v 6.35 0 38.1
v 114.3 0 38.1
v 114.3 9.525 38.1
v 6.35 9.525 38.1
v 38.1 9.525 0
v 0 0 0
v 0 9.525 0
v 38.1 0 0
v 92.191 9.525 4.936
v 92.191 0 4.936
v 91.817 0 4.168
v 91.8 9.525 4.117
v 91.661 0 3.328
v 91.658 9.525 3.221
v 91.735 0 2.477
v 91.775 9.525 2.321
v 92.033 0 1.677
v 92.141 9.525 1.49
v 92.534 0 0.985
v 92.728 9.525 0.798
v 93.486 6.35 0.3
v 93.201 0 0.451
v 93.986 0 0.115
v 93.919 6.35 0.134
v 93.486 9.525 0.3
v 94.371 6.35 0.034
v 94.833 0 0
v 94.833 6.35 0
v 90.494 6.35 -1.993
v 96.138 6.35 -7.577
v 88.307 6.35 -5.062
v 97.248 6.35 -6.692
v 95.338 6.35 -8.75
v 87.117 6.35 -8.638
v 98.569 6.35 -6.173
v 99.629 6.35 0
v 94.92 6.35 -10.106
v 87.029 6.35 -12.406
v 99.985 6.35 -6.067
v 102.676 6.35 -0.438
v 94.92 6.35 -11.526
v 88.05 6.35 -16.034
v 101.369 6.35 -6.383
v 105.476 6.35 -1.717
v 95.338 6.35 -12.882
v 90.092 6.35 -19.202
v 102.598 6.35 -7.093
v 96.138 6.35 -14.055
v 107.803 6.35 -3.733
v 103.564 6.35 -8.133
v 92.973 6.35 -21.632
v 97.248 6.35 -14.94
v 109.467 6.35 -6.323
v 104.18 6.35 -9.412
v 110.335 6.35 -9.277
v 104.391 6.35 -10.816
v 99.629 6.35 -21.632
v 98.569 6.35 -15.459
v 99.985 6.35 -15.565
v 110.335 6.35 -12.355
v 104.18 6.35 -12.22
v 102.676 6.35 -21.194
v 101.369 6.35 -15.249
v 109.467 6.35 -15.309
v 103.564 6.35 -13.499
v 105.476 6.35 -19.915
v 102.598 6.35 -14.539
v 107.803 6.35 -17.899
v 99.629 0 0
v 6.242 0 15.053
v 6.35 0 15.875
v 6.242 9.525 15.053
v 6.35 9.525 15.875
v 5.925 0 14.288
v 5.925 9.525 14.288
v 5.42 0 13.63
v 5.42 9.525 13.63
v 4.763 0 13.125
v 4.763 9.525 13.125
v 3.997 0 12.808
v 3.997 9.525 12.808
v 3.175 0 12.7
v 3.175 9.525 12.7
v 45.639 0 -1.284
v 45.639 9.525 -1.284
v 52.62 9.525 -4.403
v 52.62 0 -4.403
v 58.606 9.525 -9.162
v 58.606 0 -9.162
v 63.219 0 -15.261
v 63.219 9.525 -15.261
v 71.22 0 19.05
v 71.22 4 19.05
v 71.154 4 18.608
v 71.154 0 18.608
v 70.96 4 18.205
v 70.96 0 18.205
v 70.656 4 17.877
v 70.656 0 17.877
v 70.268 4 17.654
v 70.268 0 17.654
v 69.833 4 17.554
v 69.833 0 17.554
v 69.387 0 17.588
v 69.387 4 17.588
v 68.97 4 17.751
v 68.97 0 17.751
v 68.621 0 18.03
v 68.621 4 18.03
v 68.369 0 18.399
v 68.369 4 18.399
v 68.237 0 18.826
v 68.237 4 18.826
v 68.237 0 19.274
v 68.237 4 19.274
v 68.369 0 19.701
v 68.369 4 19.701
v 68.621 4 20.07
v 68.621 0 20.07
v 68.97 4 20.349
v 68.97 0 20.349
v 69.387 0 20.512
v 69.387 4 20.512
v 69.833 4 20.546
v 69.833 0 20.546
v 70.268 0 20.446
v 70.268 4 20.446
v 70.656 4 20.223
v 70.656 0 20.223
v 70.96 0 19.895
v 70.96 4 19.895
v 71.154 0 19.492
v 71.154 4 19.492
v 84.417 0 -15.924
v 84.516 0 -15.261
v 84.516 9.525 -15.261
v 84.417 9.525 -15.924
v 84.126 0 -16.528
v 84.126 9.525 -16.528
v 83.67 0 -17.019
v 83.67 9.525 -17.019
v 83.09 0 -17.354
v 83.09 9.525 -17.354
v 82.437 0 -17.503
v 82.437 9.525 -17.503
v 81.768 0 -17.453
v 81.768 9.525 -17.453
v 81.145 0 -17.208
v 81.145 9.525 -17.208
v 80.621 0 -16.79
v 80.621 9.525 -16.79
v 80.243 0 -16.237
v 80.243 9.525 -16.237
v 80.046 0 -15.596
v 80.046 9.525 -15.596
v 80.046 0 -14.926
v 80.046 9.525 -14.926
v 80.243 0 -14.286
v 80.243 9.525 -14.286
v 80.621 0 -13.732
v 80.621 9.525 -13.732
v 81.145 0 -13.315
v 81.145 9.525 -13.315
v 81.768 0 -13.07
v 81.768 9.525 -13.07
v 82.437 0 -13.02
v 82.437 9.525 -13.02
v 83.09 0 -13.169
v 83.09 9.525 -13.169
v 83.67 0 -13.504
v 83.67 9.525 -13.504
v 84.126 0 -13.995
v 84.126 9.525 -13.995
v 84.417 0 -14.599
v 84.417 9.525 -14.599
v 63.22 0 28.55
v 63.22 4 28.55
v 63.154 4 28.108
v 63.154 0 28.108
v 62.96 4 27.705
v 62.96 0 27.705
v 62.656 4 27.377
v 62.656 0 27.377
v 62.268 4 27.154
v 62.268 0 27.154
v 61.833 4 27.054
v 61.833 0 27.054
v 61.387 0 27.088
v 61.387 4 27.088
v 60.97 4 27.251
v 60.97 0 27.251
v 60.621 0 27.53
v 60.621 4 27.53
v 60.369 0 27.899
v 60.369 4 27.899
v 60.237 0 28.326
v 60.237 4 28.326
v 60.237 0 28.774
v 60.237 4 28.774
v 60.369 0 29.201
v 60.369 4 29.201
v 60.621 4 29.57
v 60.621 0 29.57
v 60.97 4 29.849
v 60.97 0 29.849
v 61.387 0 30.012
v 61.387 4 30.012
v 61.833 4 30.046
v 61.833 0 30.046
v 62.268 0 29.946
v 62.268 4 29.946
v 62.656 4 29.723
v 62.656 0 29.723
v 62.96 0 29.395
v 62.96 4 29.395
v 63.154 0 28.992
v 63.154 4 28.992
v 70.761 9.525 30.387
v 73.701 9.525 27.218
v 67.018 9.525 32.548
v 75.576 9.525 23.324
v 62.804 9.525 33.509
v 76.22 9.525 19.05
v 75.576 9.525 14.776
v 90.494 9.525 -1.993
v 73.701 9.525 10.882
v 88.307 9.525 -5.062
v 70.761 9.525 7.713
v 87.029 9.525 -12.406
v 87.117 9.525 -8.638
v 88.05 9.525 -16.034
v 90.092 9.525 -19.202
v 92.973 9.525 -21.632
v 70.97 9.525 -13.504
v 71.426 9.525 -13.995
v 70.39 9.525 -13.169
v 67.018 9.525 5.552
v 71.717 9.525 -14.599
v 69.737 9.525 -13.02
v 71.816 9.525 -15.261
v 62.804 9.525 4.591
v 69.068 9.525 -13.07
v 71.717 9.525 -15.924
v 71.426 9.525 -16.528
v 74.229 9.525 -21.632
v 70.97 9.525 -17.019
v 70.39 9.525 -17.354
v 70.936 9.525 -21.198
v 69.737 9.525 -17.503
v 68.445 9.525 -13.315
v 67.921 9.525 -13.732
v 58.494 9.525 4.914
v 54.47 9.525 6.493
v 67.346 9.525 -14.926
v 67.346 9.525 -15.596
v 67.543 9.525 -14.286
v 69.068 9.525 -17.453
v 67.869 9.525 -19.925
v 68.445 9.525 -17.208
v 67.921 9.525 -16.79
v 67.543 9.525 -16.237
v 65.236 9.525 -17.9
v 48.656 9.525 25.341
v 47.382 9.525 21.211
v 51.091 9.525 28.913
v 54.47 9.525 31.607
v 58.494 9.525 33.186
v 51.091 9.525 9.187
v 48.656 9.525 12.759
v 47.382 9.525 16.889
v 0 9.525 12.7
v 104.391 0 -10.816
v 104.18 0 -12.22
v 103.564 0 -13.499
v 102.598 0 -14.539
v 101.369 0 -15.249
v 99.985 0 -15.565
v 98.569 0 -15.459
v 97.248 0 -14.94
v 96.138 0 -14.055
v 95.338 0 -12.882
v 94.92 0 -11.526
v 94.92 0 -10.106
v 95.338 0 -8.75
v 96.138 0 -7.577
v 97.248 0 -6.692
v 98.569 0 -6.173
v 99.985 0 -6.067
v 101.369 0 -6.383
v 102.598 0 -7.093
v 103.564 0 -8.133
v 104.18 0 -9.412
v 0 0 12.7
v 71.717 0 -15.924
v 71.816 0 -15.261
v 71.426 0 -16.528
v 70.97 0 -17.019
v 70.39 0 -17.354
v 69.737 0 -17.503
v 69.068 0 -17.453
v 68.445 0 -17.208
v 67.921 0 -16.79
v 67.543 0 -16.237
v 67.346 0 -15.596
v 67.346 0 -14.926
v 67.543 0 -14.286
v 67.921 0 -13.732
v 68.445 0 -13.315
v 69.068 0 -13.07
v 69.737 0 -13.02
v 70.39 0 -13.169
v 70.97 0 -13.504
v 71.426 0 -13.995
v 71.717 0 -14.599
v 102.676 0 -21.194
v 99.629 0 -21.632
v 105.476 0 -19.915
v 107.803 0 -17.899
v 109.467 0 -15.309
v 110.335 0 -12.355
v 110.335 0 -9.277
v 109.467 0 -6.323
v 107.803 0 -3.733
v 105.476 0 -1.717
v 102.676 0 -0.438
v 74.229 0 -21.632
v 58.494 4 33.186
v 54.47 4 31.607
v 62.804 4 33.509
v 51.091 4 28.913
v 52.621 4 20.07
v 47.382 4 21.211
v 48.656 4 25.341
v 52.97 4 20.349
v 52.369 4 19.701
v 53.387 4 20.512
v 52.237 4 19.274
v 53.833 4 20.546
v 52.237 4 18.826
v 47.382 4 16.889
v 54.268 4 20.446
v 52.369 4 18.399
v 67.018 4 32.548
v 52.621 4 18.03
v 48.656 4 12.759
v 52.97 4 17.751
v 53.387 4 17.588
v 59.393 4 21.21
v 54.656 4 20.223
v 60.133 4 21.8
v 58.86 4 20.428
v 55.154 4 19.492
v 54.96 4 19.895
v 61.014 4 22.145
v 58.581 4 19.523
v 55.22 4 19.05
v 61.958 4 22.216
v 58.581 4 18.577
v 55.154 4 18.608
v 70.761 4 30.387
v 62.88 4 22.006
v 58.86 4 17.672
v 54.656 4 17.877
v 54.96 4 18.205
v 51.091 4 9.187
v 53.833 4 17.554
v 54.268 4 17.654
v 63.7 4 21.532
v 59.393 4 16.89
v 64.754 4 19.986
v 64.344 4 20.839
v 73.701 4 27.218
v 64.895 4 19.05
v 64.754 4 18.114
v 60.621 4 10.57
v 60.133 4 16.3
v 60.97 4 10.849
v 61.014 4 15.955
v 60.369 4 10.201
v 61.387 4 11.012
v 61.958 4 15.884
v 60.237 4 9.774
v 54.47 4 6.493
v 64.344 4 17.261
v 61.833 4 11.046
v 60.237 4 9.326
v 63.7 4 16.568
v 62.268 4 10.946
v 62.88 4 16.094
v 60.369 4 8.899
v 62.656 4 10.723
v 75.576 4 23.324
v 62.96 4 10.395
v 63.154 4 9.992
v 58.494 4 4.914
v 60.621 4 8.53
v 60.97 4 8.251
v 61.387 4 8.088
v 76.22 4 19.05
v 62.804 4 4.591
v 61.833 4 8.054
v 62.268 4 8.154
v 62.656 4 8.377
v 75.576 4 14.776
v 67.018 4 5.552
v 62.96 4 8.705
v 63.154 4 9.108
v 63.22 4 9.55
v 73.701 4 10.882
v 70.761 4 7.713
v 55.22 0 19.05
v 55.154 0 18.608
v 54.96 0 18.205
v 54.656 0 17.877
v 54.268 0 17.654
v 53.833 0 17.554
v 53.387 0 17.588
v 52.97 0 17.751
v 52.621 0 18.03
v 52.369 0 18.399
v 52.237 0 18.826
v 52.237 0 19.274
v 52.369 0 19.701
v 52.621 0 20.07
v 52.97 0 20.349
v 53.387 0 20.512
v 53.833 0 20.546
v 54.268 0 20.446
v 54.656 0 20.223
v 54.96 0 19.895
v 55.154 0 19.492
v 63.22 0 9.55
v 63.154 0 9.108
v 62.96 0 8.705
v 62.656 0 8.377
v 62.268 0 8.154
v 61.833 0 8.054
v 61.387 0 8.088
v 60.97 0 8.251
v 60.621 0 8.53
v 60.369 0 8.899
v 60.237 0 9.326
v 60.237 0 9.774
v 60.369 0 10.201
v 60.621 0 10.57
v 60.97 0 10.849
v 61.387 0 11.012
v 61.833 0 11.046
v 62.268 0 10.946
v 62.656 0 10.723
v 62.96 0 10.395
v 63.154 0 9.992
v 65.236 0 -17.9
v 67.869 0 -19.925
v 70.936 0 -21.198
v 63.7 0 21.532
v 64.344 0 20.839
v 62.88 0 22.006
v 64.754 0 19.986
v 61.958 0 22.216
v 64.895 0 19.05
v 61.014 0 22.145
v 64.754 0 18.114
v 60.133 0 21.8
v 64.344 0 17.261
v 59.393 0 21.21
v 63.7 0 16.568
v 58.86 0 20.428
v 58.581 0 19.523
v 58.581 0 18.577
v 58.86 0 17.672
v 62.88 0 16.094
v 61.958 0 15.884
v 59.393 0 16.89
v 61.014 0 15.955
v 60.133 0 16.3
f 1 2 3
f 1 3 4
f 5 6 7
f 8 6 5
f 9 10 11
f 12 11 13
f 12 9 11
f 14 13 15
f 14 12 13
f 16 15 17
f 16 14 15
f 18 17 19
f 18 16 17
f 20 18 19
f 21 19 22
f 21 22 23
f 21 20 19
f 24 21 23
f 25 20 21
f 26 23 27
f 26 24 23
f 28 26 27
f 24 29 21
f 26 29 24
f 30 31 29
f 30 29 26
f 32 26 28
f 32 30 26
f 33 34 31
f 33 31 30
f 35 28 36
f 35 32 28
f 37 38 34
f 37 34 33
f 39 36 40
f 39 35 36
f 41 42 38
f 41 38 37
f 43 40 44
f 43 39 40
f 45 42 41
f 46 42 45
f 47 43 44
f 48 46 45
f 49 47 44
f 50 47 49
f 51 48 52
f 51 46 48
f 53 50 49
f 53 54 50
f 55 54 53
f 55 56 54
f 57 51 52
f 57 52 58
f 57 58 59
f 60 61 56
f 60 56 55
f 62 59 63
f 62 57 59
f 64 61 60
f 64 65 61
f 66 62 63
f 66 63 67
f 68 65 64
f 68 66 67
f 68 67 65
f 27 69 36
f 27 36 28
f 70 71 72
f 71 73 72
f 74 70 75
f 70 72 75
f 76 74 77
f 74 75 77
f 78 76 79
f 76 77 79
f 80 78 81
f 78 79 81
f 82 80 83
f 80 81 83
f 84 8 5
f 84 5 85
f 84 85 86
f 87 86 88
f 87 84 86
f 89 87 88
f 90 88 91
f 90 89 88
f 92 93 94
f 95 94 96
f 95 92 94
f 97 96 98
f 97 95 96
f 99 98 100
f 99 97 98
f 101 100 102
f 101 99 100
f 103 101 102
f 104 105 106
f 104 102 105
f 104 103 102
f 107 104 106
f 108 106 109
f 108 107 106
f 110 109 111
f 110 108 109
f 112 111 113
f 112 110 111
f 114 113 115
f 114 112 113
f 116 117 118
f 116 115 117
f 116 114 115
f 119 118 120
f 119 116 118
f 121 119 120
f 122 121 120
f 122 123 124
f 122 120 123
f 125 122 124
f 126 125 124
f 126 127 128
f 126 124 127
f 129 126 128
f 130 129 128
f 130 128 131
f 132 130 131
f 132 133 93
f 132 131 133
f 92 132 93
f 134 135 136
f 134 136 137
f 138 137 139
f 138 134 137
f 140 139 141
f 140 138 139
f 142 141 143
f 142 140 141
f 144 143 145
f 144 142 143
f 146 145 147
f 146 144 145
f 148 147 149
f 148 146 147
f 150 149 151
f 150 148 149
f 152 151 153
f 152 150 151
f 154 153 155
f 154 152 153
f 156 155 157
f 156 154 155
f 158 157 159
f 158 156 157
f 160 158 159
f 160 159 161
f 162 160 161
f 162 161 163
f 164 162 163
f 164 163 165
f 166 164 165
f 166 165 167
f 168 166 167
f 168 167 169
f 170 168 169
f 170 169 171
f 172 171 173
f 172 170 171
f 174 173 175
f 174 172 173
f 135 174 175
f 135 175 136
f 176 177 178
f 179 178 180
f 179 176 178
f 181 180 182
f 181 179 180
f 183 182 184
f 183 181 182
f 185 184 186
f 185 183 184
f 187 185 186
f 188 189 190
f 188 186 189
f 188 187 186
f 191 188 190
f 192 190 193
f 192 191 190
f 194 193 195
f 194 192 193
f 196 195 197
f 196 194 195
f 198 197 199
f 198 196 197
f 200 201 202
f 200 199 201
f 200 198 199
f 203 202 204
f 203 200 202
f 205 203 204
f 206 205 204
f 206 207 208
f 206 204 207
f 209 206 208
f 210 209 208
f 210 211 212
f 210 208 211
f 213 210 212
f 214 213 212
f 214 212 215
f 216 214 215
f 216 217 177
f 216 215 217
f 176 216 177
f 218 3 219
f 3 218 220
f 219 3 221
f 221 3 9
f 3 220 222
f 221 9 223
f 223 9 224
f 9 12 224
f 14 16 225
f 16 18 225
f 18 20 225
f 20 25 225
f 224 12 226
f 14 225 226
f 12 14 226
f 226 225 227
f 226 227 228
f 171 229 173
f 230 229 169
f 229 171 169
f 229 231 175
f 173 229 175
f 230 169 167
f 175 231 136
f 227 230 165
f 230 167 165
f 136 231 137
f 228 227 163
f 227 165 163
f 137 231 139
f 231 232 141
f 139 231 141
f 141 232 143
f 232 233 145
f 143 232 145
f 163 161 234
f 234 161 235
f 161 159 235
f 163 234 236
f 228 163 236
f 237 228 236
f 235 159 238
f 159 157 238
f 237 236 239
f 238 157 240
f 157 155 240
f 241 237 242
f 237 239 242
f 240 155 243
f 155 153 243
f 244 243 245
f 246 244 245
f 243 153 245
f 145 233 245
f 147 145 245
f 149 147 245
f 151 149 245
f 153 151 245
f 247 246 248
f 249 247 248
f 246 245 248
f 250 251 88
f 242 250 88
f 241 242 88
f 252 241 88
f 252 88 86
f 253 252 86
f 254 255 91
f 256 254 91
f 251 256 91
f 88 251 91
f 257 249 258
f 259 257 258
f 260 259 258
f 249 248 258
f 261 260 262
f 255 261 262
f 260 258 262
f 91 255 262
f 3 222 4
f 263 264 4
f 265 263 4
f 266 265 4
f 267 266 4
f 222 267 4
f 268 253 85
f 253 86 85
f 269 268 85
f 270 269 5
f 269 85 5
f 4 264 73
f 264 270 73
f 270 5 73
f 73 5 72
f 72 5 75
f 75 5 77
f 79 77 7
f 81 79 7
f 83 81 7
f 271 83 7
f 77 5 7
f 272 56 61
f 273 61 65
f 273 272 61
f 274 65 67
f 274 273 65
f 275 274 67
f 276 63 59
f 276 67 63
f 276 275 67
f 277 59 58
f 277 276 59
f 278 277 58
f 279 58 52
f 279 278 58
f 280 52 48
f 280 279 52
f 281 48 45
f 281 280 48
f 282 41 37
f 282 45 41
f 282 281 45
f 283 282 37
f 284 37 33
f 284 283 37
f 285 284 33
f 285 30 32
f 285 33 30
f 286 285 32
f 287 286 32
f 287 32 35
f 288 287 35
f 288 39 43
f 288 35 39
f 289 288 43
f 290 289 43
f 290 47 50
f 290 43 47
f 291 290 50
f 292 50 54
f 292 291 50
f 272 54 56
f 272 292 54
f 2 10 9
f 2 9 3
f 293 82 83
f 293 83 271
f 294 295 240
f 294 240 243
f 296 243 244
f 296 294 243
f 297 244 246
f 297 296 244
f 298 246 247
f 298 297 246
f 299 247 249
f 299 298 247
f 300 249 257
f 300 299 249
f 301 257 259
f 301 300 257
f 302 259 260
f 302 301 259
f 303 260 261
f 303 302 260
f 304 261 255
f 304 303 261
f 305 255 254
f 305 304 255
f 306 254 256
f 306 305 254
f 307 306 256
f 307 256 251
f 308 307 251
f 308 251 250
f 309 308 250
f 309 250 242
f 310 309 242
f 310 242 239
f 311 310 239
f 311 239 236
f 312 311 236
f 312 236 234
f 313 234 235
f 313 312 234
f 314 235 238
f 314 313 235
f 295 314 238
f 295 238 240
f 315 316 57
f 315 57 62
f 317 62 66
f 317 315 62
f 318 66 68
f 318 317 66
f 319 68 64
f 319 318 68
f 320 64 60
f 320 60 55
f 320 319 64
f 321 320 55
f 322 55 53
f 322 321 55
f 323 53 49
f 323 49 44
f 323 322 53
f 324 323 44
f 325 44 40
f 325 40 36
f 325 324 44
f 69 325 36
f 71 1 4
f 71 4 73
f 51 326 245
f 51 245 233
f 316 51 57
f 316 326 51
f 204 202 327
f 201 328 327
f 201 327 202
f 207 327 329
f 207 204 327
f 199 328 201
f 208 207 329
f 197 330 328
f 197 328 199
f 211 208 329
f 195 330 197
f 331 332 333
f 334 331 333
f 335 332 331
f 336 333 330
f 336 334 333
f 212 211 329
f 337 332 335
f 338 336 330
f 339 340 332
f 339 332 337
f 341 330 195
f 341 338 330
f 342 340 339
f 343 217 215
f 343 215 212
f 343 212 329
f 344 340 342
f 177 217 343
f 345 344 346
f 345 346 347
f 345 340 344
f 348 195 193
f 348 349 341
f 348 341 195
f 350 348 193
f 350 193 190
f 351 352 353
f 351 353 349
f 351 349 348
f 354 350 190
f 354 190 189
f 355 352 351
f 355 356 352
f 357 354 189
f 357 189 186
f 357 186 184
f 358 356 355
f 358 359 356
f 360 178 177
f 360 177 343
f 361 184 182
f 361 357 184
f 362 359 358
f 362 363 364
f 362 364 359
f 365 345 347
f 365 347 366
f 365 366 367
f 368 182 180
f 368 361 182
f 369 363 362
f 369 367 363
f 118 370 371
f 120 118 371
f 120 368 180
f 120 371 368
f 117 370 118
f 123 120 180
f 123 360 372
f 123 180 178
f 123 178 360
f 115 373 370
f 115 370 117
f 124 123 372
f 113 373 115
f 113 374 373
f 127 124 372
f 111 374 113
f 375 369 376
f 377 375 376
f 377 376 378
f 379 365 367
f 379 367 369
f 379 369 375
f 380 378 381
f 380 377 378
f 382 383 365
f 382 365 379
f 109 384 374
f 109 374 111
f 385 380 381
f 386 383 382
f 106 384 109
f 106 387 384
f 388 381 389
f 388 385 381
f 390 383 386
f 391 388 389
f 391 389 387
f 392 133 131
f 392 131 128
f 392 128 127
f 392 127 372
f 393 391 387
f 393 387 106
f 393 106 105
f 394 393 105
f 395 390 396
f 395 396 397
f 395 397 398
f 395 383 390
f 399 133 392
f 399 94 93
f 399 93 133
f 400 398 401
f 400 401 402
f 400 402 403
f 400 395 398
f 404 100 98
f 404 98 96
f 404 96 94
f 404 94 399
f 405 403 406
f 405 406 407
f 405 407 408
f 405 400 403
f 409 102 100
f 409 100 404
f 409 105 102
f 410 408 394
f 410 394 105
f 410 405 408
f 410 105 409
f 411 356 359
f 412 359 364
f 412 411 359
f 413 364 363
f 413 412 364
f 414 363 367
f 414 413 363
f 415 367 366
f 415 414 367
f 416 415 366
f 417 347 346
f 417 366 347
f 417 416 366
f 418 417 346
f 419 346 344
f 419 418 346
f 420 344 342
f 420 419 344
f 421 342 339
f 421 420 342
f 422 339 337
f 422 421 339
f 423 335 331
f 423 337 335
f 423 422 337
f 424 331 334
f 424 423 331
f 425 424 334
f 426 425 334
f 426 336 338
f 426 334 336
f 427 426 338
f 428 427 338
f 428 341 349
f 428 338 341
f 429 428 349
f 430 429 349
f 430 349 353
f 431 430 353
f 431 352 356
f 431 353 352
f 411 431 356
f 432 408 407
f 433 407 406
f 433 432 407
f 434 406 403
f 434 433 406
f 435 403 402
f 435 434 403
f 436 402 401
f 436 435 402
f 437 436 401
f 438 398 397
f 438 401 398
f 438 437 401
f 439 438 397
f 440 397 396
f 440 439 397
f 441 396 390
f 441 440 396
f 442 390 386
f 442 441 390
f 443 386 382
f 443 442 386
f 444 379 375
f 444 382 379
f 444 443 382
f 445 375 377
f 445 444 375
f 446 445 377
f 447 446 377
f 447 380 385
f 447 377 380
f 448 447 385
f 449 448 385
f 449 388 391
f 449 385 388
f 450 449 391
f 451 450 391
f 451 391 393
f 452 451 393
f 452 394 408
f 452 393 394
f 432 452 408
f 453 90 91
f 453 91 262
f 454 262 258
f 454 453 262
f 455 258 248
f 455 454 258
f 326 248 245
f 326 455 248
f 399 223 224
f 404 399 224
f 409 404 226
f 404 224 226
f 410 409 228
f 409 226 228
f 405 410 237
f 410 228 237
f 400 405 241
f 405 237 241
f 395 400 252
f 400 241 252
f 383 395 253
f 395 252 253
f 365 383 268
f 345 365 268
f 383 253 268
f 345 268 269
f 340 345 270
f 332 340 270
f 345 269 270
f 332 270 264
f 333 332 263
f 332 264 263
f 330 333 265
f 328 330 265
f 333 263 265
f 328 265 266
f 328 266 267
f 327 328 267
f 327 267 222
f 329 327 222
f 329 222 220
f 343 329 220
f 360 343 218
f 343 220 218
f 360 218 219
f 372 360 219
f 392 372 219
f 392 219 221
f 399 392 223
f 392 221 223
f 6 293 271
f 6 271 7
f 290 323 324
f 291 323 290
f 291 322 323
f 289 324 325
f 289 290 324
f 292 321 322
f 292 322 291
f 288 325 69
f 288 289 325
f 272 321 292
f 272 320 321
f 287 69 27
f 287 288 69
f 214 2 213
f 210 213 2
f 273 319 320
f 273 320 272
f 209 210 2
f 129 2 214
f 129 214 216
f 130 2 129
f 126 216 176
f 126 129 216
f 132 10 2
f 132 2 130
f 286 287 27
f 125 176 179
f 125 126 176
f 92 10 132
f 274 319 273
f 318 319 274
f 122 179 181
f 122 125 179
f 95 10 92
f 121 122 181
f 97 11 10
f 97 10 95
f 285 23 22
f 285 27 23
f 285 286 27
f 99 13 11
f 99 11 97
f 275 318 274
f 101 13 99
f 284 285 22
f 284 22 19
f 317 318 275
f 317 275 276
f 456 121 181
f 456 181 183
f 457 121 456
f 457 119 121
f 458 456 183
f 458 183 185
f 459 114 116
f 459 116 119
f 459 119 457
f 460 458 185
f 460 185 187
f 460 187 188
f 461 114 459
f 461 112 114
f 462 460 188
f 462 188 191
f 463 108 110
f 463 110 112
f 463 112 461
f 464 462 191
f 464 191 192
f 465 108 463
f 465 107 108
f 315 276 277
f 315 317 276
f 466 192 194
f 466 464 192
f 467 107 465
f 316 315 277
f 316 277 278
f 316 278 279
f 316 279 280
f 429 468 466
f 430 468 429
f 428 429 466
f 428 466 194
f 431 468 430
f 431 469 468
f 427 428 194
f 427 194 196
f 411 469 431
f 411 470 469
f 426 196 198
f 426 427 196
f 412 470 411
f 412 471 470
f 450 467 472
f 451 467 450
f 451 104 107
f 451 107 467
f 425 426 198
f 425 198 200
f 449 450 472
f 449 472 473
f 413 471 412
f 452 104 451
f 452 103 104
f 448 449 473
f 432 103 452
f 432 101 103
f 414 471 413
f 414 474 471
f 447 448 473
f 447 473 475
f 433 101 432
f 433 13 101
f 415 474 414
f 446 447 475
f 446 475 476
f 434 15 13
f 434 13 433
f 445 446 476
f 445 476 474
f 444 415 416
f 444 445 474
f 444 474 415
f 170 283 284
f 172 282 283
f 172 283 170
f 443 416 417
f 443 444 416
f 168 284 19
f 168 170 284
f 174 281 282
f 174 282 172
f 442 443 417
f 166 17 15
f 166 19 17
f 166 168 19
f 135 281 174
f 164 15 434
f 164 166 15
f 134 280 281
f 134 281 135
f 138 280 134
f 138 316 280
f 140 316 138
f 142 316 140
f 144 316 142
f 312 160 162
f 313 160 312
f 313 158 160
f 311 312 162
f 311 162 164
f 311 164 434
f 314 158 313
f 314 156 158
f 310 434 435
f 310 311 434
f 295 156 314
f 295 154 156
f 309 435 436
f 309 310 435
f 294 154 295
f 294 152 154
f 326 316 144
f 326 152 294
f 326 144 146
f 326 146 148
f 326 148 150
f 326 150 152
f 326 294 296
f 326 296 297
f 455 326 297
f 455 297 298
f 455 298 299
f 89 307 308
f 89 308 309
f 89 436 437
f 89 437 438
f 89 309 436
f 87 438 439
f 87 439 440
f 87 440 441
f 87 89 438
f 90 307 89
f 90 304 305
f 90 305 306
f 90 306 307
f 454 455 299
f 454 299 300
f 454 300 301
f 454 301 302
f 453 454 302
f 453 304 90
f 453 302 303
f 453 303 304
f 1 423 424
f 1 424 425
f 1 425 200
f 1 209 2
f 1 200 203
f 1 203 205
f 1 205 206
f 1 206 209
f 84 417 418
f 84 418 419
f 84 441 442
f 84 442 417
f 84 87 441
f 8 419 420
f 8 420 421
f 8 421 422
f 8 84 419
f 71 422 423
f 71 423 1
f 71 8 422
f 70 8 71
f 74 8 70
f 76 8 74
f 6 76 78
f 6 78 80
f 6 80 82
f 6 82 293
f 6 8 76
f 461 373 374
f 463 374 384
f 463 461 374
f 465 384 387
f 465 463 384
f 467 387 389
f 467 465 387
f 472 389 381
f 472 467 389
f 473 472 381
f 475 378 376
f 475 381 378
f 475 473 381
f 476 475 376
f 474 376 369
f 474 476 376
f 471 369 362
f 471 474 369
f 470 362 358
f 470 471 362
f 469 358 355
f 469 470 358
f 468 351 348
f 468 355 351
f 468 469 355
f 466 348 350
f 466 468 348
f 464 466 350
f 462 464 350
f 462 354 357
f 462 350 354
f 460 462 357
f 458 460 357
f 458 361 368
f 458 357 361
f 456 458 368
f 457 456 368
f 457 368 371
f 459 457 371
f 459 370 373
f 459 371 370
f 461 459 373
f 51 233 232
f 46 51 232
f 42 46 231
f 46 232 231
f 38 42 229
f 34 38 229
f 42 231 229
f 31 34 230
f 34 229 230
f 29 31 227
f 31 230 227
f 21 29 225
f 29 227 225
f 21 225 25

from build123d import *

# Parameters (mm, degrees)
SKETCH1_R           = 4.7625
SKETCH1_R_2         = 2.2479
SKETCH1_R_3         = 1.5
SKETCH1_R_4         = 3.175
BOSS_EXTRUDE1_DEPTH = 9.525
FILLET1_R           = 3.175
FILLET2_R           = 3.175
SKETCH2_R           = 14.5
CUT_EXTRUDE1_DEPTH  = 5.525
SKETCH3_R           = 12.7
CUT_EXTRUDE2_DEPTH  = 3.175


with BuildPart() as part:
    # Sketch1 → Boss-Extrude1 (new body)
    with BuildSketch(Plane(origin=(0, 0, 0), x_dir=(1, 0, 0), z_dir=(0, 1, 0))):
        with BuildLine():
            Line((0, 0), (38.1, 0))
            ThreePointArc((38.1, 0), (52.620300687, 4.403064286), (63.218539249, 15.261399634))
            ThreePointArc((63.218539249, 15.261399634), (67.86863694, 19.924564568), (74.228922018, 21.631986448))
            Line((74.228922018, 21.631986448), (99.628922018, 21.631986448))
            ThreePointArc((99.628922018, 21.631986448), (110.444915242, 10.815993224), (99.628922018, 0))
            Line((99.628922018, 0), (88.9, 0))
            Line((88.9, 0), (114.3, -38.1))
            Line((114.3, -38.1), (6.35, -38.1))
            Line((6.35, -38.1), (6.35, -12.7))
            Line((6.35, -12.7), (0, -12.7))
            Line((0, -12.7), (0, 0))
        make_face()
        with Locations((99.628922018, 10.815993224)):
            Circle(SKETCH1_R, mode=Mode.SUBTRACT)
        with Locations((69.568539249, 15.261399634)):
            Circle(SKETCH1_R_2, mode=Mode.SUBTRACT)
        with Locations((82.268539249, 15.261399634)):
            Circle(SKETCH1_R_2, mode=Mode.SUBTRACT)
        with Locations((69.720479044, -19.05)):
            Circle(SKETCH1_R_3, mode=Mode.SUBTRACT)
        with Locations((61.720479044, -28.55)):
            Circle(SKETCH1_R_3, mode=Mode.SUBTRACT)
        with Locations((53.720479044, -19.05)):
            Circle(SKETCH1_R_3, mode=Mode.SUBTRACT)
        with Locations((61.720479044, -9.55)):
            Circle(SKETCH1_R_3, mode=Mode.SUBTRACT)
        with Locations((61.720479044, -19.05)):
            Circle(SKETCH1_R_4, mode=Mode.SUBTRACT)
    extrude(amount=BOSS_EXTRUDE1_DEPTH)

    # Fillet1
    fillet1_edges = [part.edges().sort_by_distance(p)[0] for p in [
        (88.9, 4.7625, 0),
    ]]
    fillet(fillet1_edges, radius=FILLET1_R)

    # Fillet2
    fillet2_edges = [part.edges().sort_by_distance(p)[0] for p in [
        (6.35, 4.7625, 12.7),
    ]]
    fillet(fillet2_edges, radius=FILLET2_R)

    # Sketch2 → Cut-Extrude1 (cut)
    with BuildSketch(Plane(origin=(0, 9.525, 0), x_dir=(1, 0, 0), z_dir=(0, 1, 0))):
        with Locations((61.720479044, -19.05)):
            Circle(SKETCH2_R)
    extrude(amount=-CUT_EXTRUDE1_DEPTH, mode=Mode.SUBTRACT)

    # Sketch3 → Cut-Extrude2 (cut)
    with BuildSketch(Plane(origin=(0, 9.525, 0), x_dir=(1, 0, 0), z_dir=(0, 1, 0))):
        with Locations((99.628922018, 10.815993224)):
            Circle(SKETCH3_R)
    extrude(amount=-CUT_EXTRUDE2_DEPTH, mode=Mode.SUBTRACT)


solid = part.part
